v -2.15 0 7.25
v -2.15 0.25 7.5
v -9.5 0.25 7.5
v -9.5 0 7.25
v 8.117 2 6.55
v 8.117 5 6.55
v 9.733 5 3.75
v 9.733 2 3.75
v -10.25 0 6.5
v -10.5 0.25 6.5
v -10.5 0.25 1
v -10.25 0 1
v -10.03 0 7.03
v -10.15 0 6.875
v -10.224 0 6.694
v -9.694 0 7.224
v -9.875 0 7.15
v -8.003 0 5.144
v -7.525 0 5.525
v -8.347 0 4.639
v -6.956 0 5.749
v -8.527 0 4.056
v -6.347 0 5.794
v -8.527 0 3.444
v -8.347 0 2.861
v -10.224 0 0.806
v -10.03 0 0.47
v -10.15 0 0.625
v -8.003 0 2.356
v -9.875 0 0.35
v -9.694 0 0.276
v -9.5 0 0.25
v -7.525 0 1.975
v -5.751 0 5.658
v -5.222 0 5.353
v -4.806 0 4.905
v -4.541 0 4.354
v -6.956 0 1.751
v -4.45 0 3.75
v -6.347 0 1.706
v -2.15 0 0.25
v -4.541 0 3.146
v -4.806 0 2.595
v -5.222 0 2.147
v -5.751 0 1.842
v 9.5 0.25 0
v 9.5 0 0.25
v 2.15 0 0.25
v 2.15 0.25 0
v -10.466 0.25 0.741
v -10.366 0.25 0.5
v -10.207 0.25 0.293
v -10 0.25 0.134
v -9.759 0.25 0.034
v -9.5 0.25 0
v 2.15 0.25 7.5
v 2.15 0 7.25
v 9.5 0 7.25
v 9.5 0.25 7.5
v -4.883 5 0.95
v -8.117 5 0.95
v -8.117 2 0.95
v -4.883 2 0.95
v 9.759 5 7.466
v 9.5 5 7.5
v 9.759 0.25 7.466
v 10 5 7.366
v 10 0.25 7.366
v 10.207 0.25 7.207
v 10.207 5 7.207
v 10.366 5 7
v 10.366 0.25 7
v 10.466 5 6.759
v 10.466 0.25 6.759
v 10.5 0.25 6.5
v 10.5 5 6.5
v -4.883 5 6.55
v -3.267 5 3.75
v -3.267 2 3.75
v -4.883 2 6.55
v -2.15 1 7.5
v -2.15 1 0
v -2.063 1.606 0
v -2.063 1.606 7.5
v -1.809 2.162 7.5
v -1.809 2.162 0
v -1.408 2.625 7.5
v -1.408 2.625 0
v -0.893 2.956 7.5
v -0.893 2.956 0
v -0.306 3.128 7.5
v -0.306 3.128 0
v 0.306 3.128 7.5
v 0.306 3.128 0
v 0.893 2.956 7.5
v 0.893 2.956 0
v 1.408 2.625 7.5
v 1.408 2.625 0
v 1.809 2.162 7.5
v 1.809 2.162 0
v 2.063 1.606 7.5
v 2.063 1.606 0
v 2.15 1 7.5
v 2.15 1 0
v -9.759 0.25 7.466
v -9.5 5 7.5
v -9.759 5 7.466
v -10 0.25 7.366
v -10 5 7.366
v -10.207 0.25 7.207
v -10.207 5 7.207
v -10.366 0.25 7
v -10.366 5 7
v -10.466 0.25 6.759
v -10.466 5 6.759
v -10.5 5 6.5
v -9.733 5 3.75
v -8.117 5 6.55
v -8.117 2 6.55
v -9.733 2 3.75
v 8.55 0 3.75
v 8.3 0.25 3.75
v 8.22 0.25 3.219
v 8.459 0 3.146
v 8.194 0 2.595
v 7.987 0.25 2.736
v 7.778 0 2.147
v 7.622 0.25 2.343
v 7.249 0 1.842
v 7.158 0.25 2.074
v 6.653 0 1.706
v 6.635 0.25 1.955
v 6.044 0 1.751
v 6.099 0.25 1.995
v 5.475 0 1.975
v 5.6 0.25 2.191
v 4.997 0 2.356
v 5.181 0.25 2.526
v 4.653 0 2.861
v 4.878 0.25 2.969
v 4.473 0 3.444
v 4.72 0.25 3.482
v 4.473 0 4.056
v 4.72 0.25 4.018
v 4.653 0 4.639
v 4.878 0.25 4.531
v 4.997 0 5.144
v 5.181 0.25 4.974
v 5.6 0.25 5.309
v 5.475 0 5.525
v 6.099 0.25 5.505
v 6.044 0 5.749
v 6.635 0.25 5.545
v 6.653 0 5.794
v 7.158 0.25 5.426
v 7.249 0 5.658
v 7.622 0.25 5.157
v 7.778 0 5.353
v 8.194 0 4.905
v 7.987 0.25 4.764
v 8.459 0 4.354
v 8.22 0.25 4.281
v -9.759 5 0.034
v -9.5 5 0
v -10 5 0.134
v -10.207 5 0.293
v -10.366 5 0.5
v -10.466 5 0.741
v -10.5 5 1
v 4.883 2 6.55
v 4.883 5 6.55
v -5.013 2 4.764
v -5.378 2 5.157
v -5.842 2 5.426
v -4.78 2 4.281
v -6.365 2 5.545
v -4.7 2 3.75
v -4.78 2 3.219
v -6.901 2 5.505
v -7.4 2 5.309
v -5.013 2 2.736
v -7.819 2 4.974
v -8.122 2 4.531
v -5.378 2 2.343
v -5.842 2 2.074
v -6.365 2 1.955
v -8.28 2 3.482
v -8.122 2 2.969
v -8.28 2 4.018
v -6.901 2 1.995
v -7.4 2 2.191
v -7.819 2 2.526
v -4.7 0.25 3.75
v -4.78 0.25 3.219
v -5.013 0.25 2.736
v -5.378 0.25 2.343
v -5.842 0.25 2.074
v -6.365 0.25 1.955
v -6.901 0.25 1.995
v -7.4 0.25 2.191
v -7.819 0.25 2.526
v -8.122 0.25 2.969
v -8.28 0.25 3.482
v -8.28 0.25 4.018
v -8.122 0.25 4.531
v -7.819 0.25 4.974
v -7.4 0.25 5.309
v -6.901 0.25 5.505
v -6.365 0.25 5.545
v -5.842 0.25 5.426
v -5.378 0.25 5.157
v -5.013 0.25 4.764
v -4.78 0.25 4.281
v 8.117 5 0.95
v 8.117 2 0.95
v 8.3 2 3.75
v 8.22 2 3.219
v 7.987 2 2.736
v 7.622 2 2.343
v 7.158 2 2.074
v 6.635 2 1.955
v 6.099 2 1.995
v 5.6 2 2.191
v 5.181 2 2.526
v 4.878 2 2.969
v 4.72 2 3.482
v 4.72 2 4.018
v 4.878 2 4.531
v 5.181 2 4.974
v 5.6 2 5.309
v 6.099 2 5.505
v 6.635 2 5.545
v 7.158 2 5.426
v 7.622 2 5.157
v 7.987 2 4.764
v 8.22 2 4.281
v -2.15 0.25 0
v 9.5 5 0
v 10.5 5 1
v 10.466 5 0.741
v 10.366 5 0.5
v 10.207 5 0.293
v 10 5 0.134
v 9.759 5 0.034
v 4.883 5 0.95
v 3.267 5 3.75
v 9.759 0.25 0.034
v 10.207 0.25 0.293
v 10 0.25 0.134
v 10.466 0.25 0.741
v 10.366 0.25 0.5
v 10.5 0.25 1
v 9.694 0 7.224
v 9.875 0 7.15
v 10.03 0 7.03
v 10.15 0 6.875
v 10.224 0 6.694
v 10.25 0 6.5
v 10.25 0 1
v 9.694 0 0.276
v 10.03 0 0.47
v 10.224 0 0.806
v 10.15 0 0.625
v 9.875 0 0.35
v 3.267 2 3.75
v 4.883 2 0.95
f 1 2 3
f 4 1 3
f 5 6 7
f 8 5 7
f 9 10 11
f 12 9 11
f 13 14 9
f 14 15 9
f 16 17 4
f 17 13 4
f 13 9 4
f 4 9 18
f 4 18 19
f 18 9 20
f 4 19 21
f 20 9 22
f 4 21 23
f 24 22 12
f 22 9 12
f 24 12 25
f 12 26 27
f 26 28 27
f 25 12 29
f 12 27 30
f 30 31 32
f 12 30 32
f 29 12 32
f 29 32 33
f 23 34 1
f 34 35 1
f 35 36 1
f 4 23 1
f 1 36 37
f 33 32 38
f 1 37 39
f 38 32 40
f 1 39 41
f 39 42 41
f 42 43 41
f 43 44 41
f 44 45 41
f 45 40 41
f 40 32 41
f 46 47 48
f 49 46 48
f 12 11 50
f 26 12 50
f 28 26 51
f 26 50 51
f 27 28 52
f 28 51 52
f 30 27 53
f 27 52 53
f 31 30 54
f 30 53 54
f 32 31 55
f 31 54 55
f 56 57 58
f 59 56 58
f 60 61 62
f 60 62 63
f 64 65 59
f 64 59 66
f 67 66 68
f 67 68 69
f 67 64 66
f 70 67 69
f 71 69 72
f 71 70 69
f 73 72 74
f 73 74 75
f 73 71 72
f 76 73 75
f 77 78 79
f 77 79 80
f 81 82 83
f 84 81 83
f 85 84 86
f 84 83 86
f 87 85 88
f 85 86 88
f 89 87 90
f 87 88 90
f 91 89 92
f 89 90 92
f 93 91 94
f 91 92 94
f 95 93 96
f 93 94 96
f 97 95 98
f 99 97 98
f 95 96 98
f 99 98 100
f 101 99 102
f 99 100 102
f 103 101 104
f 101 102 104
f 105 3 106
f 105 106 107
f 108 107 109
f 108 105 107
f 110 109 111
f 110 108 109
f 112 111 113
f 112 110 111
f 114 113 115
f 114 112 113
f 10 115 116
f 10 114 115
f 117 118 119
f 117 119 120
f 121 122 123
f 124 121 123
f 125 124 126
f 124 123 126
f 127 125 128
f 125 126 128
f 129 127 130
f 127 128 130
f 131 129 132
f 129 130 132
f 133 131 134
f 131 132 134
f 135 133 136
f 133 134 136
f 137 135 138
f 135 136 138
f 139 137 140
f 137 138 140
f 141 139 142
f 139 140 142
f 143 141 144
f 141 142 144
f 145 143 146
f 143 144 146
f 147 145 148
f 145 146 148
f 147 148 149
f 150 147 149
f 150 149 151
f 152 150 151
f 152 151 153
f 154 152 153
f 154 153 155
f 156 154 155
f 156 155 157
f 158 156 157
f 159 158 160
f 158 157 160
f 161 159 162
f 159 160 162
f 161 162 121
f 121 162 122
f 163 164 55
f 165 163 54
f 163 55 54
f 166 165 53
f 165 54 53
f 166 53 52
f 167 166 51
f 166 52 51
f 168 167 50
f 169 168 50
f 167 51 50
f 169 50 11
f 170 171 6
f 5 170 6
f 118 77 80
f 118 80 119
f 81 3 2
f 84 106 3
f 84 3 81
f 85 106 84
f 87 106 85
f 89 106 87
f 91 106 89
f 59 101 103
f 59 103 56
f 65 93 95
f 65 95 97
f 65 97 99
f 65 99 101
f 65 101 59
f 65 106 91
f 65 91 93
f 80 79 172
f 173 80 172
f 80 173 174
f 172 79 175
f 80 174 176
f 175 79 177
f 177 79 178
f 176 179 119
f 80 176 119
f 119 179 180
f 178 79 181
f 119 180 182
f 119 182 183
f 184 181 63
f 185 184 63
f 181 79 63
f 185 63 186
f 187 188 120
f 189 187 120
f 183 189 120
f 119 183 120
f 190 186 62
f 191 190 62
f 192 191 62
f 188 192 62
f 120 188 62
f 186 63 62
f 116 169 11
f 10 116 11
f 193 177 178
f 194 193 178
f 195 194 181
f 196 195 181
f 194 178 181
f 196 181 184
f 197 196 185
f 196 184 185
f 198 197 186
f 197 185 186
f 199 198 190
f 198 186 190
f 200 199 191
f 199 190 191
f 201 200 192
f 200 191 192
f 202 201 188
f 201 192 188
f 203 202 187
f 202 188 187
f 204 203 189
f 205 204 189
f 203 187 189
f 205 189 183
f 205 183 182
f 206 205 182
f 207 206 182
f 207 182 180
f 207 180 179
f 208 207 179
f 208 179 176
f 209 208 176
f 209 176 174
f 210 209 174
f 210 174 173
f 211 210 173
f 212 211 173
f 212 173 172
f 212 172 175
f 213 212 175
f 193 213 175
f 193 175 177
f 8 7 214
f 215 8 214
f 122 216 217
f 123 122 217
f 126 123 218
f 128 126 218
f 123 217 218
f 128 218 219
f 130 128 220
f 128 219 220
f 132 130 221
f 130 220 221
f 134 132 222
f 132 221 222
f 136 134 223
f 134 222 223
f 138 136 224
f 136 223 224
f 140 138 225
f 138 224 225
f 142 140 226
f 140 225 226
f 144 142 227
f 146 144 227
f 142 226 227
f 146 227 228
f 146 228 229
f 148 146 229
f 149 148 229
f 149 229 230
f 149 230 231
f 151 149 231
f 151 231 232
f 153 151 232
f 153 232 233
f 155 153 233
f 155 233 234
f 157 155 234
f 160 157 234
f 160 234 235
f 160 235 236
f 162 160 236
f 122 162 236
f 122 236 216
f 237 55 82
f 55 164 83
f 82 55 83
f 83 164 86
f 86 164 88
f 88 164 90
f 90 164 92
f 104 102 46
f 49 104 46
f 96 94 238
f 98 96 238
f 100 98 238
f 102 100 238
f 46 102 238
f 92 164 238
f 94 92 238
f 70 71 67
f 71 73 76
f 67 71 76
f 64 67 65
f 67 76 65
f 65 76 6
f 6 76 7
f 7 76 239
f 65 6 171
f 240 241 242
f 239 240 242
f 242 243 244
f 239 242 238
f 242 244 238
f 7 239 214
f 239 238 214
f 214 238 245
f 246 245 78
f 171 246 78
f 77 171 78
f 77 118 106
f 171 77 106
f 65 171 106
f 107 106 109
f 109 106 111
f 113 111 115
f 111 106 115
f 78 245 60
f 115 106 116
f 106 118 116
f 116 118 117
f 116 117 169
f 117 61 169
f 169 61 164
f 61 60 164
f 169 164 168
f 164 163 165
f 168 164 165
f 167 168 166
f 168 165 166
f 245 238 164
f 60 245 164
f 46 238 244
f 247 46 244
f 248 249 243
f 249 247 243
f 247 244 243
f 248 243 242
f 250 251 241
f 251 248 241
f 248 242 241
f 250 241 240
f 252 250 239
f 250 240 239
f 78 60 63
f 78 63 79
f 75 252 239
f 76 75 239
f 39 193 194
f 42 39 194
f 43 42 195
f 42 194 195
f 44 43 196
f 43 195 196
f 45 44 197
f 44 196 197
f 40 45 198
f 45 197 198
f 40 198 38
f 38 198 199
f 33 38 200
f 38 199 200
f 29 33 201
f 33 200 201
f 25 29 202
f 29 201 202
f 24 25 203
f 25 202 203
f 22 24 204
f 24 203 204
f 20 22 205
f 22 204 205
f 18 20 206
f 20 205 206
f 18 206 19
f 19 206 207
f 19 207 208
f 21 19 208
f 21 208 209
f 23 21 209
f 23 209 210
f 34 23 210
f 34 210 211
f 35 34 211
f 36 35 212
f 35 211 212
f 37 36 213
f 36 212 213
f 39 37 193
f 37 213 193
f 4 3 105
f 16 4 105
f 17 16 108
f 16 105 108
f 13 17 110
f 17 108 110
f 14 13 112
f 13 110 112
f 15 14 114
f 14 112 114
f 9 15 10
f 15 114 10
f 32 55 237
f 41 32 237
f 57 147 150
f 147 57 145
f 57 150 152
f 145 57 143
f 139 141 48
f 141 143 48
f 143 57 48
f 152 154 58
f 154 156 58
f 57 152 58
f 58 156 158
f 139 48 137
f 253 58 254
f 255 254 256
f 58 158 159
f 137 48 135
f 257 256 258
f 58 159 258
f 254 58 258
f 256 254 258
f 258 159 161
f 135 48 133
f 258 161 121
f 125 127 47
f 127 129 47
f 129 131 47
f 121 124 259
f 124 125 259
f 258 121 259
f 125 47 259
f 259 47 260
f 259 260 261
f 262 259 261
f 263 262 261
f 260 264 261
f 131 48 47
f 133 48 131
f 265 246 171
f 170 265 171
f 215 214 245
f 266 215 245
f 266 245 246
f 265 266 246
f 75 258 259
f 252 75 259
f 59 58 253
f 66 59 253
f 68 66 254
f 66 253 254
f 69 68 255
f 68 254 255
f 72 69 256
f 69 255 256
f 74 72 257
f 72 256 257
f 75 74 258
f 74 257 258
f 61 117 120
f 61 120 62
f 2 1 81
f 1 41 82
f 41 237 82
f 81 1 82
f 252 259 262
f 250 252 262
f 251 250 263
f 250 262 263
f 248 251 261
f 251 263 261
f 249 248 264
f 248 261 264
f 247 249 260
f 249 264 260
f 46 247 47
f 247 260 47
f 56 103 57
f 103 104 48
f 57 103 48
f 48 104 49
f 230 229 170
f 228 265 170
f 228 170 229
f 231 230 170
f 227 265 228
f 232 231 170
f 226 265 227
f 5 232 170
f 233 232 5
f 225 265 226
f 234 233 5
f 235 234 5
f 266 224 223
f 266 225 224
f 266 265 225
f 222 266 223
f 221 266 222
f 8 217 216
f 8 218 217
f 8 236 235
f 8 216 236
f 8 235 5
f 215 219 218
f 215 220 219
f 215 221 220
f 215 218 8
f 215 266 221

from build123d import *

# Parameters (mm, degrees)
EXTRUDE1_DEPTH = 7.5
SKETCH2_R      = 1.8
EXTRUDE2_DEPTH = 14.838352503
SKETCH_R       = 1.8
EXTRUDE3_DEPTH = 3
FILLET1_R      = 1
CHAMFER1_SIZE  = 0.25


with BuildPart() as part:
    # Sketch1 → Extrude1 (new body)
    with BuildSketch(Plane.XY):
        with BuildLine():
            Line((-2.15, 0), (-2.15, 1))
            ThreePointArc((-2.15, 1), (0, 3.15), (2.15, 1))
            Line((2.15, 1), (2.15, 0))
            Line((2.15, 0), (10.5, 0))
            Line((10.5, 0), (10.5, 5))
            Line((10.5, 5), (-10.5, 5))
            Line((-10.5, 5), (-10.5, 0))
            Line((-10.5, 0), (-2.15, 0))
        make_face()
    extrude(amount=EXTRUDE1_DEPTH)

    # Sketch2 → Extrude2 (cut, through all)
    with BuildSketch(Plane(origin=(0, 5, 0), x_dir=(1, 0, 0), z_dir=(0, 1, 0))):
        with Locations((6.5, -3.75)):
            Circle(SKETCH2_R)
        with Locations((-6.5, -3.75)):
            Circle(SKETCH2_R)
    extrude(amount=-EXTRUDE2_DEPTH, mode=Mode.SUBTRACT)

    # Sketch → Extrude3 (cut)
    # profile 1 of 2: a face of its own
    with BuildSketch(Plane(origin=(0, 5, 0), x_dir=(1, 0, 0), z_dir=(0, 1, 0))):
        Polygon((-8.116580754, -6.55), (-9.733161507, -3.75), (-8.116580754, -0.95), (-4.883419246, -0.95), (-3.266838493, -3.75), (-4.883419246, -6.55), align=None)
        with Locations((-6.5, -3.75)):
            Circle(SKETCH_R, mode=Mode.SUBTRACT)
    # profile 2 of 2: a face of its own
    with BuildSketch(Plane(origin=(0, 5, 0), x_dir=(1, 0, 0), z_dir=(0, 1, 0))):
        Polygon((9.733161507, -3.75), (8.116580754, -0.95), (4.883419246, -0.95), (3.266838493, -3.75), (4.883419246, -6.55), (8.116580754, -6.55), align=None)
        with Locations((6.5, -3.75)):
            Circle(SKETCH_R, mode=Mode.SUBTRACT)
    extrude(amount=-EXTRUDE3_DEPTH, mode=Mode.SUBTRACT)

    # Fillet1
    fillet1_edges = [part.edges().sort_by_distance(p)[0] for p in [
        (10.5, 2.5, 0),
        (10.5, 2.5, 7.5),
        (-10.5, 2.5, 0),
        (-10.5, 2.5, 7.5),
    ]]
    fillet(fillet1_edges, radius=FILLET1_R)

    # Chamfer1
    chamfer1_edges = [part.edges().sort_by_distance(p)[0] for p in [
        (-8.3, 0, 3.75),
        (4.7, 0, 3.75),
        (5.825, 0, 0),
        (10.207106781, 0, 0.292893219),
        (10.5, 0, 3.75),
        (10.207106781, 0, 7.207106781),
        (5.825, 0, 7.5),
        (-5.825, 0, 0),
        (-10.207106781, 0, 0.292893219),
        (-10.5, 0, 3.75),
        (-10.207106781, 0, 7.207106781),
        (-5.825, 0, 7.5),
    ]]
    chamfer(chamfer1_edges, length=CHAMFER1_SIZE)


solid = part.part
